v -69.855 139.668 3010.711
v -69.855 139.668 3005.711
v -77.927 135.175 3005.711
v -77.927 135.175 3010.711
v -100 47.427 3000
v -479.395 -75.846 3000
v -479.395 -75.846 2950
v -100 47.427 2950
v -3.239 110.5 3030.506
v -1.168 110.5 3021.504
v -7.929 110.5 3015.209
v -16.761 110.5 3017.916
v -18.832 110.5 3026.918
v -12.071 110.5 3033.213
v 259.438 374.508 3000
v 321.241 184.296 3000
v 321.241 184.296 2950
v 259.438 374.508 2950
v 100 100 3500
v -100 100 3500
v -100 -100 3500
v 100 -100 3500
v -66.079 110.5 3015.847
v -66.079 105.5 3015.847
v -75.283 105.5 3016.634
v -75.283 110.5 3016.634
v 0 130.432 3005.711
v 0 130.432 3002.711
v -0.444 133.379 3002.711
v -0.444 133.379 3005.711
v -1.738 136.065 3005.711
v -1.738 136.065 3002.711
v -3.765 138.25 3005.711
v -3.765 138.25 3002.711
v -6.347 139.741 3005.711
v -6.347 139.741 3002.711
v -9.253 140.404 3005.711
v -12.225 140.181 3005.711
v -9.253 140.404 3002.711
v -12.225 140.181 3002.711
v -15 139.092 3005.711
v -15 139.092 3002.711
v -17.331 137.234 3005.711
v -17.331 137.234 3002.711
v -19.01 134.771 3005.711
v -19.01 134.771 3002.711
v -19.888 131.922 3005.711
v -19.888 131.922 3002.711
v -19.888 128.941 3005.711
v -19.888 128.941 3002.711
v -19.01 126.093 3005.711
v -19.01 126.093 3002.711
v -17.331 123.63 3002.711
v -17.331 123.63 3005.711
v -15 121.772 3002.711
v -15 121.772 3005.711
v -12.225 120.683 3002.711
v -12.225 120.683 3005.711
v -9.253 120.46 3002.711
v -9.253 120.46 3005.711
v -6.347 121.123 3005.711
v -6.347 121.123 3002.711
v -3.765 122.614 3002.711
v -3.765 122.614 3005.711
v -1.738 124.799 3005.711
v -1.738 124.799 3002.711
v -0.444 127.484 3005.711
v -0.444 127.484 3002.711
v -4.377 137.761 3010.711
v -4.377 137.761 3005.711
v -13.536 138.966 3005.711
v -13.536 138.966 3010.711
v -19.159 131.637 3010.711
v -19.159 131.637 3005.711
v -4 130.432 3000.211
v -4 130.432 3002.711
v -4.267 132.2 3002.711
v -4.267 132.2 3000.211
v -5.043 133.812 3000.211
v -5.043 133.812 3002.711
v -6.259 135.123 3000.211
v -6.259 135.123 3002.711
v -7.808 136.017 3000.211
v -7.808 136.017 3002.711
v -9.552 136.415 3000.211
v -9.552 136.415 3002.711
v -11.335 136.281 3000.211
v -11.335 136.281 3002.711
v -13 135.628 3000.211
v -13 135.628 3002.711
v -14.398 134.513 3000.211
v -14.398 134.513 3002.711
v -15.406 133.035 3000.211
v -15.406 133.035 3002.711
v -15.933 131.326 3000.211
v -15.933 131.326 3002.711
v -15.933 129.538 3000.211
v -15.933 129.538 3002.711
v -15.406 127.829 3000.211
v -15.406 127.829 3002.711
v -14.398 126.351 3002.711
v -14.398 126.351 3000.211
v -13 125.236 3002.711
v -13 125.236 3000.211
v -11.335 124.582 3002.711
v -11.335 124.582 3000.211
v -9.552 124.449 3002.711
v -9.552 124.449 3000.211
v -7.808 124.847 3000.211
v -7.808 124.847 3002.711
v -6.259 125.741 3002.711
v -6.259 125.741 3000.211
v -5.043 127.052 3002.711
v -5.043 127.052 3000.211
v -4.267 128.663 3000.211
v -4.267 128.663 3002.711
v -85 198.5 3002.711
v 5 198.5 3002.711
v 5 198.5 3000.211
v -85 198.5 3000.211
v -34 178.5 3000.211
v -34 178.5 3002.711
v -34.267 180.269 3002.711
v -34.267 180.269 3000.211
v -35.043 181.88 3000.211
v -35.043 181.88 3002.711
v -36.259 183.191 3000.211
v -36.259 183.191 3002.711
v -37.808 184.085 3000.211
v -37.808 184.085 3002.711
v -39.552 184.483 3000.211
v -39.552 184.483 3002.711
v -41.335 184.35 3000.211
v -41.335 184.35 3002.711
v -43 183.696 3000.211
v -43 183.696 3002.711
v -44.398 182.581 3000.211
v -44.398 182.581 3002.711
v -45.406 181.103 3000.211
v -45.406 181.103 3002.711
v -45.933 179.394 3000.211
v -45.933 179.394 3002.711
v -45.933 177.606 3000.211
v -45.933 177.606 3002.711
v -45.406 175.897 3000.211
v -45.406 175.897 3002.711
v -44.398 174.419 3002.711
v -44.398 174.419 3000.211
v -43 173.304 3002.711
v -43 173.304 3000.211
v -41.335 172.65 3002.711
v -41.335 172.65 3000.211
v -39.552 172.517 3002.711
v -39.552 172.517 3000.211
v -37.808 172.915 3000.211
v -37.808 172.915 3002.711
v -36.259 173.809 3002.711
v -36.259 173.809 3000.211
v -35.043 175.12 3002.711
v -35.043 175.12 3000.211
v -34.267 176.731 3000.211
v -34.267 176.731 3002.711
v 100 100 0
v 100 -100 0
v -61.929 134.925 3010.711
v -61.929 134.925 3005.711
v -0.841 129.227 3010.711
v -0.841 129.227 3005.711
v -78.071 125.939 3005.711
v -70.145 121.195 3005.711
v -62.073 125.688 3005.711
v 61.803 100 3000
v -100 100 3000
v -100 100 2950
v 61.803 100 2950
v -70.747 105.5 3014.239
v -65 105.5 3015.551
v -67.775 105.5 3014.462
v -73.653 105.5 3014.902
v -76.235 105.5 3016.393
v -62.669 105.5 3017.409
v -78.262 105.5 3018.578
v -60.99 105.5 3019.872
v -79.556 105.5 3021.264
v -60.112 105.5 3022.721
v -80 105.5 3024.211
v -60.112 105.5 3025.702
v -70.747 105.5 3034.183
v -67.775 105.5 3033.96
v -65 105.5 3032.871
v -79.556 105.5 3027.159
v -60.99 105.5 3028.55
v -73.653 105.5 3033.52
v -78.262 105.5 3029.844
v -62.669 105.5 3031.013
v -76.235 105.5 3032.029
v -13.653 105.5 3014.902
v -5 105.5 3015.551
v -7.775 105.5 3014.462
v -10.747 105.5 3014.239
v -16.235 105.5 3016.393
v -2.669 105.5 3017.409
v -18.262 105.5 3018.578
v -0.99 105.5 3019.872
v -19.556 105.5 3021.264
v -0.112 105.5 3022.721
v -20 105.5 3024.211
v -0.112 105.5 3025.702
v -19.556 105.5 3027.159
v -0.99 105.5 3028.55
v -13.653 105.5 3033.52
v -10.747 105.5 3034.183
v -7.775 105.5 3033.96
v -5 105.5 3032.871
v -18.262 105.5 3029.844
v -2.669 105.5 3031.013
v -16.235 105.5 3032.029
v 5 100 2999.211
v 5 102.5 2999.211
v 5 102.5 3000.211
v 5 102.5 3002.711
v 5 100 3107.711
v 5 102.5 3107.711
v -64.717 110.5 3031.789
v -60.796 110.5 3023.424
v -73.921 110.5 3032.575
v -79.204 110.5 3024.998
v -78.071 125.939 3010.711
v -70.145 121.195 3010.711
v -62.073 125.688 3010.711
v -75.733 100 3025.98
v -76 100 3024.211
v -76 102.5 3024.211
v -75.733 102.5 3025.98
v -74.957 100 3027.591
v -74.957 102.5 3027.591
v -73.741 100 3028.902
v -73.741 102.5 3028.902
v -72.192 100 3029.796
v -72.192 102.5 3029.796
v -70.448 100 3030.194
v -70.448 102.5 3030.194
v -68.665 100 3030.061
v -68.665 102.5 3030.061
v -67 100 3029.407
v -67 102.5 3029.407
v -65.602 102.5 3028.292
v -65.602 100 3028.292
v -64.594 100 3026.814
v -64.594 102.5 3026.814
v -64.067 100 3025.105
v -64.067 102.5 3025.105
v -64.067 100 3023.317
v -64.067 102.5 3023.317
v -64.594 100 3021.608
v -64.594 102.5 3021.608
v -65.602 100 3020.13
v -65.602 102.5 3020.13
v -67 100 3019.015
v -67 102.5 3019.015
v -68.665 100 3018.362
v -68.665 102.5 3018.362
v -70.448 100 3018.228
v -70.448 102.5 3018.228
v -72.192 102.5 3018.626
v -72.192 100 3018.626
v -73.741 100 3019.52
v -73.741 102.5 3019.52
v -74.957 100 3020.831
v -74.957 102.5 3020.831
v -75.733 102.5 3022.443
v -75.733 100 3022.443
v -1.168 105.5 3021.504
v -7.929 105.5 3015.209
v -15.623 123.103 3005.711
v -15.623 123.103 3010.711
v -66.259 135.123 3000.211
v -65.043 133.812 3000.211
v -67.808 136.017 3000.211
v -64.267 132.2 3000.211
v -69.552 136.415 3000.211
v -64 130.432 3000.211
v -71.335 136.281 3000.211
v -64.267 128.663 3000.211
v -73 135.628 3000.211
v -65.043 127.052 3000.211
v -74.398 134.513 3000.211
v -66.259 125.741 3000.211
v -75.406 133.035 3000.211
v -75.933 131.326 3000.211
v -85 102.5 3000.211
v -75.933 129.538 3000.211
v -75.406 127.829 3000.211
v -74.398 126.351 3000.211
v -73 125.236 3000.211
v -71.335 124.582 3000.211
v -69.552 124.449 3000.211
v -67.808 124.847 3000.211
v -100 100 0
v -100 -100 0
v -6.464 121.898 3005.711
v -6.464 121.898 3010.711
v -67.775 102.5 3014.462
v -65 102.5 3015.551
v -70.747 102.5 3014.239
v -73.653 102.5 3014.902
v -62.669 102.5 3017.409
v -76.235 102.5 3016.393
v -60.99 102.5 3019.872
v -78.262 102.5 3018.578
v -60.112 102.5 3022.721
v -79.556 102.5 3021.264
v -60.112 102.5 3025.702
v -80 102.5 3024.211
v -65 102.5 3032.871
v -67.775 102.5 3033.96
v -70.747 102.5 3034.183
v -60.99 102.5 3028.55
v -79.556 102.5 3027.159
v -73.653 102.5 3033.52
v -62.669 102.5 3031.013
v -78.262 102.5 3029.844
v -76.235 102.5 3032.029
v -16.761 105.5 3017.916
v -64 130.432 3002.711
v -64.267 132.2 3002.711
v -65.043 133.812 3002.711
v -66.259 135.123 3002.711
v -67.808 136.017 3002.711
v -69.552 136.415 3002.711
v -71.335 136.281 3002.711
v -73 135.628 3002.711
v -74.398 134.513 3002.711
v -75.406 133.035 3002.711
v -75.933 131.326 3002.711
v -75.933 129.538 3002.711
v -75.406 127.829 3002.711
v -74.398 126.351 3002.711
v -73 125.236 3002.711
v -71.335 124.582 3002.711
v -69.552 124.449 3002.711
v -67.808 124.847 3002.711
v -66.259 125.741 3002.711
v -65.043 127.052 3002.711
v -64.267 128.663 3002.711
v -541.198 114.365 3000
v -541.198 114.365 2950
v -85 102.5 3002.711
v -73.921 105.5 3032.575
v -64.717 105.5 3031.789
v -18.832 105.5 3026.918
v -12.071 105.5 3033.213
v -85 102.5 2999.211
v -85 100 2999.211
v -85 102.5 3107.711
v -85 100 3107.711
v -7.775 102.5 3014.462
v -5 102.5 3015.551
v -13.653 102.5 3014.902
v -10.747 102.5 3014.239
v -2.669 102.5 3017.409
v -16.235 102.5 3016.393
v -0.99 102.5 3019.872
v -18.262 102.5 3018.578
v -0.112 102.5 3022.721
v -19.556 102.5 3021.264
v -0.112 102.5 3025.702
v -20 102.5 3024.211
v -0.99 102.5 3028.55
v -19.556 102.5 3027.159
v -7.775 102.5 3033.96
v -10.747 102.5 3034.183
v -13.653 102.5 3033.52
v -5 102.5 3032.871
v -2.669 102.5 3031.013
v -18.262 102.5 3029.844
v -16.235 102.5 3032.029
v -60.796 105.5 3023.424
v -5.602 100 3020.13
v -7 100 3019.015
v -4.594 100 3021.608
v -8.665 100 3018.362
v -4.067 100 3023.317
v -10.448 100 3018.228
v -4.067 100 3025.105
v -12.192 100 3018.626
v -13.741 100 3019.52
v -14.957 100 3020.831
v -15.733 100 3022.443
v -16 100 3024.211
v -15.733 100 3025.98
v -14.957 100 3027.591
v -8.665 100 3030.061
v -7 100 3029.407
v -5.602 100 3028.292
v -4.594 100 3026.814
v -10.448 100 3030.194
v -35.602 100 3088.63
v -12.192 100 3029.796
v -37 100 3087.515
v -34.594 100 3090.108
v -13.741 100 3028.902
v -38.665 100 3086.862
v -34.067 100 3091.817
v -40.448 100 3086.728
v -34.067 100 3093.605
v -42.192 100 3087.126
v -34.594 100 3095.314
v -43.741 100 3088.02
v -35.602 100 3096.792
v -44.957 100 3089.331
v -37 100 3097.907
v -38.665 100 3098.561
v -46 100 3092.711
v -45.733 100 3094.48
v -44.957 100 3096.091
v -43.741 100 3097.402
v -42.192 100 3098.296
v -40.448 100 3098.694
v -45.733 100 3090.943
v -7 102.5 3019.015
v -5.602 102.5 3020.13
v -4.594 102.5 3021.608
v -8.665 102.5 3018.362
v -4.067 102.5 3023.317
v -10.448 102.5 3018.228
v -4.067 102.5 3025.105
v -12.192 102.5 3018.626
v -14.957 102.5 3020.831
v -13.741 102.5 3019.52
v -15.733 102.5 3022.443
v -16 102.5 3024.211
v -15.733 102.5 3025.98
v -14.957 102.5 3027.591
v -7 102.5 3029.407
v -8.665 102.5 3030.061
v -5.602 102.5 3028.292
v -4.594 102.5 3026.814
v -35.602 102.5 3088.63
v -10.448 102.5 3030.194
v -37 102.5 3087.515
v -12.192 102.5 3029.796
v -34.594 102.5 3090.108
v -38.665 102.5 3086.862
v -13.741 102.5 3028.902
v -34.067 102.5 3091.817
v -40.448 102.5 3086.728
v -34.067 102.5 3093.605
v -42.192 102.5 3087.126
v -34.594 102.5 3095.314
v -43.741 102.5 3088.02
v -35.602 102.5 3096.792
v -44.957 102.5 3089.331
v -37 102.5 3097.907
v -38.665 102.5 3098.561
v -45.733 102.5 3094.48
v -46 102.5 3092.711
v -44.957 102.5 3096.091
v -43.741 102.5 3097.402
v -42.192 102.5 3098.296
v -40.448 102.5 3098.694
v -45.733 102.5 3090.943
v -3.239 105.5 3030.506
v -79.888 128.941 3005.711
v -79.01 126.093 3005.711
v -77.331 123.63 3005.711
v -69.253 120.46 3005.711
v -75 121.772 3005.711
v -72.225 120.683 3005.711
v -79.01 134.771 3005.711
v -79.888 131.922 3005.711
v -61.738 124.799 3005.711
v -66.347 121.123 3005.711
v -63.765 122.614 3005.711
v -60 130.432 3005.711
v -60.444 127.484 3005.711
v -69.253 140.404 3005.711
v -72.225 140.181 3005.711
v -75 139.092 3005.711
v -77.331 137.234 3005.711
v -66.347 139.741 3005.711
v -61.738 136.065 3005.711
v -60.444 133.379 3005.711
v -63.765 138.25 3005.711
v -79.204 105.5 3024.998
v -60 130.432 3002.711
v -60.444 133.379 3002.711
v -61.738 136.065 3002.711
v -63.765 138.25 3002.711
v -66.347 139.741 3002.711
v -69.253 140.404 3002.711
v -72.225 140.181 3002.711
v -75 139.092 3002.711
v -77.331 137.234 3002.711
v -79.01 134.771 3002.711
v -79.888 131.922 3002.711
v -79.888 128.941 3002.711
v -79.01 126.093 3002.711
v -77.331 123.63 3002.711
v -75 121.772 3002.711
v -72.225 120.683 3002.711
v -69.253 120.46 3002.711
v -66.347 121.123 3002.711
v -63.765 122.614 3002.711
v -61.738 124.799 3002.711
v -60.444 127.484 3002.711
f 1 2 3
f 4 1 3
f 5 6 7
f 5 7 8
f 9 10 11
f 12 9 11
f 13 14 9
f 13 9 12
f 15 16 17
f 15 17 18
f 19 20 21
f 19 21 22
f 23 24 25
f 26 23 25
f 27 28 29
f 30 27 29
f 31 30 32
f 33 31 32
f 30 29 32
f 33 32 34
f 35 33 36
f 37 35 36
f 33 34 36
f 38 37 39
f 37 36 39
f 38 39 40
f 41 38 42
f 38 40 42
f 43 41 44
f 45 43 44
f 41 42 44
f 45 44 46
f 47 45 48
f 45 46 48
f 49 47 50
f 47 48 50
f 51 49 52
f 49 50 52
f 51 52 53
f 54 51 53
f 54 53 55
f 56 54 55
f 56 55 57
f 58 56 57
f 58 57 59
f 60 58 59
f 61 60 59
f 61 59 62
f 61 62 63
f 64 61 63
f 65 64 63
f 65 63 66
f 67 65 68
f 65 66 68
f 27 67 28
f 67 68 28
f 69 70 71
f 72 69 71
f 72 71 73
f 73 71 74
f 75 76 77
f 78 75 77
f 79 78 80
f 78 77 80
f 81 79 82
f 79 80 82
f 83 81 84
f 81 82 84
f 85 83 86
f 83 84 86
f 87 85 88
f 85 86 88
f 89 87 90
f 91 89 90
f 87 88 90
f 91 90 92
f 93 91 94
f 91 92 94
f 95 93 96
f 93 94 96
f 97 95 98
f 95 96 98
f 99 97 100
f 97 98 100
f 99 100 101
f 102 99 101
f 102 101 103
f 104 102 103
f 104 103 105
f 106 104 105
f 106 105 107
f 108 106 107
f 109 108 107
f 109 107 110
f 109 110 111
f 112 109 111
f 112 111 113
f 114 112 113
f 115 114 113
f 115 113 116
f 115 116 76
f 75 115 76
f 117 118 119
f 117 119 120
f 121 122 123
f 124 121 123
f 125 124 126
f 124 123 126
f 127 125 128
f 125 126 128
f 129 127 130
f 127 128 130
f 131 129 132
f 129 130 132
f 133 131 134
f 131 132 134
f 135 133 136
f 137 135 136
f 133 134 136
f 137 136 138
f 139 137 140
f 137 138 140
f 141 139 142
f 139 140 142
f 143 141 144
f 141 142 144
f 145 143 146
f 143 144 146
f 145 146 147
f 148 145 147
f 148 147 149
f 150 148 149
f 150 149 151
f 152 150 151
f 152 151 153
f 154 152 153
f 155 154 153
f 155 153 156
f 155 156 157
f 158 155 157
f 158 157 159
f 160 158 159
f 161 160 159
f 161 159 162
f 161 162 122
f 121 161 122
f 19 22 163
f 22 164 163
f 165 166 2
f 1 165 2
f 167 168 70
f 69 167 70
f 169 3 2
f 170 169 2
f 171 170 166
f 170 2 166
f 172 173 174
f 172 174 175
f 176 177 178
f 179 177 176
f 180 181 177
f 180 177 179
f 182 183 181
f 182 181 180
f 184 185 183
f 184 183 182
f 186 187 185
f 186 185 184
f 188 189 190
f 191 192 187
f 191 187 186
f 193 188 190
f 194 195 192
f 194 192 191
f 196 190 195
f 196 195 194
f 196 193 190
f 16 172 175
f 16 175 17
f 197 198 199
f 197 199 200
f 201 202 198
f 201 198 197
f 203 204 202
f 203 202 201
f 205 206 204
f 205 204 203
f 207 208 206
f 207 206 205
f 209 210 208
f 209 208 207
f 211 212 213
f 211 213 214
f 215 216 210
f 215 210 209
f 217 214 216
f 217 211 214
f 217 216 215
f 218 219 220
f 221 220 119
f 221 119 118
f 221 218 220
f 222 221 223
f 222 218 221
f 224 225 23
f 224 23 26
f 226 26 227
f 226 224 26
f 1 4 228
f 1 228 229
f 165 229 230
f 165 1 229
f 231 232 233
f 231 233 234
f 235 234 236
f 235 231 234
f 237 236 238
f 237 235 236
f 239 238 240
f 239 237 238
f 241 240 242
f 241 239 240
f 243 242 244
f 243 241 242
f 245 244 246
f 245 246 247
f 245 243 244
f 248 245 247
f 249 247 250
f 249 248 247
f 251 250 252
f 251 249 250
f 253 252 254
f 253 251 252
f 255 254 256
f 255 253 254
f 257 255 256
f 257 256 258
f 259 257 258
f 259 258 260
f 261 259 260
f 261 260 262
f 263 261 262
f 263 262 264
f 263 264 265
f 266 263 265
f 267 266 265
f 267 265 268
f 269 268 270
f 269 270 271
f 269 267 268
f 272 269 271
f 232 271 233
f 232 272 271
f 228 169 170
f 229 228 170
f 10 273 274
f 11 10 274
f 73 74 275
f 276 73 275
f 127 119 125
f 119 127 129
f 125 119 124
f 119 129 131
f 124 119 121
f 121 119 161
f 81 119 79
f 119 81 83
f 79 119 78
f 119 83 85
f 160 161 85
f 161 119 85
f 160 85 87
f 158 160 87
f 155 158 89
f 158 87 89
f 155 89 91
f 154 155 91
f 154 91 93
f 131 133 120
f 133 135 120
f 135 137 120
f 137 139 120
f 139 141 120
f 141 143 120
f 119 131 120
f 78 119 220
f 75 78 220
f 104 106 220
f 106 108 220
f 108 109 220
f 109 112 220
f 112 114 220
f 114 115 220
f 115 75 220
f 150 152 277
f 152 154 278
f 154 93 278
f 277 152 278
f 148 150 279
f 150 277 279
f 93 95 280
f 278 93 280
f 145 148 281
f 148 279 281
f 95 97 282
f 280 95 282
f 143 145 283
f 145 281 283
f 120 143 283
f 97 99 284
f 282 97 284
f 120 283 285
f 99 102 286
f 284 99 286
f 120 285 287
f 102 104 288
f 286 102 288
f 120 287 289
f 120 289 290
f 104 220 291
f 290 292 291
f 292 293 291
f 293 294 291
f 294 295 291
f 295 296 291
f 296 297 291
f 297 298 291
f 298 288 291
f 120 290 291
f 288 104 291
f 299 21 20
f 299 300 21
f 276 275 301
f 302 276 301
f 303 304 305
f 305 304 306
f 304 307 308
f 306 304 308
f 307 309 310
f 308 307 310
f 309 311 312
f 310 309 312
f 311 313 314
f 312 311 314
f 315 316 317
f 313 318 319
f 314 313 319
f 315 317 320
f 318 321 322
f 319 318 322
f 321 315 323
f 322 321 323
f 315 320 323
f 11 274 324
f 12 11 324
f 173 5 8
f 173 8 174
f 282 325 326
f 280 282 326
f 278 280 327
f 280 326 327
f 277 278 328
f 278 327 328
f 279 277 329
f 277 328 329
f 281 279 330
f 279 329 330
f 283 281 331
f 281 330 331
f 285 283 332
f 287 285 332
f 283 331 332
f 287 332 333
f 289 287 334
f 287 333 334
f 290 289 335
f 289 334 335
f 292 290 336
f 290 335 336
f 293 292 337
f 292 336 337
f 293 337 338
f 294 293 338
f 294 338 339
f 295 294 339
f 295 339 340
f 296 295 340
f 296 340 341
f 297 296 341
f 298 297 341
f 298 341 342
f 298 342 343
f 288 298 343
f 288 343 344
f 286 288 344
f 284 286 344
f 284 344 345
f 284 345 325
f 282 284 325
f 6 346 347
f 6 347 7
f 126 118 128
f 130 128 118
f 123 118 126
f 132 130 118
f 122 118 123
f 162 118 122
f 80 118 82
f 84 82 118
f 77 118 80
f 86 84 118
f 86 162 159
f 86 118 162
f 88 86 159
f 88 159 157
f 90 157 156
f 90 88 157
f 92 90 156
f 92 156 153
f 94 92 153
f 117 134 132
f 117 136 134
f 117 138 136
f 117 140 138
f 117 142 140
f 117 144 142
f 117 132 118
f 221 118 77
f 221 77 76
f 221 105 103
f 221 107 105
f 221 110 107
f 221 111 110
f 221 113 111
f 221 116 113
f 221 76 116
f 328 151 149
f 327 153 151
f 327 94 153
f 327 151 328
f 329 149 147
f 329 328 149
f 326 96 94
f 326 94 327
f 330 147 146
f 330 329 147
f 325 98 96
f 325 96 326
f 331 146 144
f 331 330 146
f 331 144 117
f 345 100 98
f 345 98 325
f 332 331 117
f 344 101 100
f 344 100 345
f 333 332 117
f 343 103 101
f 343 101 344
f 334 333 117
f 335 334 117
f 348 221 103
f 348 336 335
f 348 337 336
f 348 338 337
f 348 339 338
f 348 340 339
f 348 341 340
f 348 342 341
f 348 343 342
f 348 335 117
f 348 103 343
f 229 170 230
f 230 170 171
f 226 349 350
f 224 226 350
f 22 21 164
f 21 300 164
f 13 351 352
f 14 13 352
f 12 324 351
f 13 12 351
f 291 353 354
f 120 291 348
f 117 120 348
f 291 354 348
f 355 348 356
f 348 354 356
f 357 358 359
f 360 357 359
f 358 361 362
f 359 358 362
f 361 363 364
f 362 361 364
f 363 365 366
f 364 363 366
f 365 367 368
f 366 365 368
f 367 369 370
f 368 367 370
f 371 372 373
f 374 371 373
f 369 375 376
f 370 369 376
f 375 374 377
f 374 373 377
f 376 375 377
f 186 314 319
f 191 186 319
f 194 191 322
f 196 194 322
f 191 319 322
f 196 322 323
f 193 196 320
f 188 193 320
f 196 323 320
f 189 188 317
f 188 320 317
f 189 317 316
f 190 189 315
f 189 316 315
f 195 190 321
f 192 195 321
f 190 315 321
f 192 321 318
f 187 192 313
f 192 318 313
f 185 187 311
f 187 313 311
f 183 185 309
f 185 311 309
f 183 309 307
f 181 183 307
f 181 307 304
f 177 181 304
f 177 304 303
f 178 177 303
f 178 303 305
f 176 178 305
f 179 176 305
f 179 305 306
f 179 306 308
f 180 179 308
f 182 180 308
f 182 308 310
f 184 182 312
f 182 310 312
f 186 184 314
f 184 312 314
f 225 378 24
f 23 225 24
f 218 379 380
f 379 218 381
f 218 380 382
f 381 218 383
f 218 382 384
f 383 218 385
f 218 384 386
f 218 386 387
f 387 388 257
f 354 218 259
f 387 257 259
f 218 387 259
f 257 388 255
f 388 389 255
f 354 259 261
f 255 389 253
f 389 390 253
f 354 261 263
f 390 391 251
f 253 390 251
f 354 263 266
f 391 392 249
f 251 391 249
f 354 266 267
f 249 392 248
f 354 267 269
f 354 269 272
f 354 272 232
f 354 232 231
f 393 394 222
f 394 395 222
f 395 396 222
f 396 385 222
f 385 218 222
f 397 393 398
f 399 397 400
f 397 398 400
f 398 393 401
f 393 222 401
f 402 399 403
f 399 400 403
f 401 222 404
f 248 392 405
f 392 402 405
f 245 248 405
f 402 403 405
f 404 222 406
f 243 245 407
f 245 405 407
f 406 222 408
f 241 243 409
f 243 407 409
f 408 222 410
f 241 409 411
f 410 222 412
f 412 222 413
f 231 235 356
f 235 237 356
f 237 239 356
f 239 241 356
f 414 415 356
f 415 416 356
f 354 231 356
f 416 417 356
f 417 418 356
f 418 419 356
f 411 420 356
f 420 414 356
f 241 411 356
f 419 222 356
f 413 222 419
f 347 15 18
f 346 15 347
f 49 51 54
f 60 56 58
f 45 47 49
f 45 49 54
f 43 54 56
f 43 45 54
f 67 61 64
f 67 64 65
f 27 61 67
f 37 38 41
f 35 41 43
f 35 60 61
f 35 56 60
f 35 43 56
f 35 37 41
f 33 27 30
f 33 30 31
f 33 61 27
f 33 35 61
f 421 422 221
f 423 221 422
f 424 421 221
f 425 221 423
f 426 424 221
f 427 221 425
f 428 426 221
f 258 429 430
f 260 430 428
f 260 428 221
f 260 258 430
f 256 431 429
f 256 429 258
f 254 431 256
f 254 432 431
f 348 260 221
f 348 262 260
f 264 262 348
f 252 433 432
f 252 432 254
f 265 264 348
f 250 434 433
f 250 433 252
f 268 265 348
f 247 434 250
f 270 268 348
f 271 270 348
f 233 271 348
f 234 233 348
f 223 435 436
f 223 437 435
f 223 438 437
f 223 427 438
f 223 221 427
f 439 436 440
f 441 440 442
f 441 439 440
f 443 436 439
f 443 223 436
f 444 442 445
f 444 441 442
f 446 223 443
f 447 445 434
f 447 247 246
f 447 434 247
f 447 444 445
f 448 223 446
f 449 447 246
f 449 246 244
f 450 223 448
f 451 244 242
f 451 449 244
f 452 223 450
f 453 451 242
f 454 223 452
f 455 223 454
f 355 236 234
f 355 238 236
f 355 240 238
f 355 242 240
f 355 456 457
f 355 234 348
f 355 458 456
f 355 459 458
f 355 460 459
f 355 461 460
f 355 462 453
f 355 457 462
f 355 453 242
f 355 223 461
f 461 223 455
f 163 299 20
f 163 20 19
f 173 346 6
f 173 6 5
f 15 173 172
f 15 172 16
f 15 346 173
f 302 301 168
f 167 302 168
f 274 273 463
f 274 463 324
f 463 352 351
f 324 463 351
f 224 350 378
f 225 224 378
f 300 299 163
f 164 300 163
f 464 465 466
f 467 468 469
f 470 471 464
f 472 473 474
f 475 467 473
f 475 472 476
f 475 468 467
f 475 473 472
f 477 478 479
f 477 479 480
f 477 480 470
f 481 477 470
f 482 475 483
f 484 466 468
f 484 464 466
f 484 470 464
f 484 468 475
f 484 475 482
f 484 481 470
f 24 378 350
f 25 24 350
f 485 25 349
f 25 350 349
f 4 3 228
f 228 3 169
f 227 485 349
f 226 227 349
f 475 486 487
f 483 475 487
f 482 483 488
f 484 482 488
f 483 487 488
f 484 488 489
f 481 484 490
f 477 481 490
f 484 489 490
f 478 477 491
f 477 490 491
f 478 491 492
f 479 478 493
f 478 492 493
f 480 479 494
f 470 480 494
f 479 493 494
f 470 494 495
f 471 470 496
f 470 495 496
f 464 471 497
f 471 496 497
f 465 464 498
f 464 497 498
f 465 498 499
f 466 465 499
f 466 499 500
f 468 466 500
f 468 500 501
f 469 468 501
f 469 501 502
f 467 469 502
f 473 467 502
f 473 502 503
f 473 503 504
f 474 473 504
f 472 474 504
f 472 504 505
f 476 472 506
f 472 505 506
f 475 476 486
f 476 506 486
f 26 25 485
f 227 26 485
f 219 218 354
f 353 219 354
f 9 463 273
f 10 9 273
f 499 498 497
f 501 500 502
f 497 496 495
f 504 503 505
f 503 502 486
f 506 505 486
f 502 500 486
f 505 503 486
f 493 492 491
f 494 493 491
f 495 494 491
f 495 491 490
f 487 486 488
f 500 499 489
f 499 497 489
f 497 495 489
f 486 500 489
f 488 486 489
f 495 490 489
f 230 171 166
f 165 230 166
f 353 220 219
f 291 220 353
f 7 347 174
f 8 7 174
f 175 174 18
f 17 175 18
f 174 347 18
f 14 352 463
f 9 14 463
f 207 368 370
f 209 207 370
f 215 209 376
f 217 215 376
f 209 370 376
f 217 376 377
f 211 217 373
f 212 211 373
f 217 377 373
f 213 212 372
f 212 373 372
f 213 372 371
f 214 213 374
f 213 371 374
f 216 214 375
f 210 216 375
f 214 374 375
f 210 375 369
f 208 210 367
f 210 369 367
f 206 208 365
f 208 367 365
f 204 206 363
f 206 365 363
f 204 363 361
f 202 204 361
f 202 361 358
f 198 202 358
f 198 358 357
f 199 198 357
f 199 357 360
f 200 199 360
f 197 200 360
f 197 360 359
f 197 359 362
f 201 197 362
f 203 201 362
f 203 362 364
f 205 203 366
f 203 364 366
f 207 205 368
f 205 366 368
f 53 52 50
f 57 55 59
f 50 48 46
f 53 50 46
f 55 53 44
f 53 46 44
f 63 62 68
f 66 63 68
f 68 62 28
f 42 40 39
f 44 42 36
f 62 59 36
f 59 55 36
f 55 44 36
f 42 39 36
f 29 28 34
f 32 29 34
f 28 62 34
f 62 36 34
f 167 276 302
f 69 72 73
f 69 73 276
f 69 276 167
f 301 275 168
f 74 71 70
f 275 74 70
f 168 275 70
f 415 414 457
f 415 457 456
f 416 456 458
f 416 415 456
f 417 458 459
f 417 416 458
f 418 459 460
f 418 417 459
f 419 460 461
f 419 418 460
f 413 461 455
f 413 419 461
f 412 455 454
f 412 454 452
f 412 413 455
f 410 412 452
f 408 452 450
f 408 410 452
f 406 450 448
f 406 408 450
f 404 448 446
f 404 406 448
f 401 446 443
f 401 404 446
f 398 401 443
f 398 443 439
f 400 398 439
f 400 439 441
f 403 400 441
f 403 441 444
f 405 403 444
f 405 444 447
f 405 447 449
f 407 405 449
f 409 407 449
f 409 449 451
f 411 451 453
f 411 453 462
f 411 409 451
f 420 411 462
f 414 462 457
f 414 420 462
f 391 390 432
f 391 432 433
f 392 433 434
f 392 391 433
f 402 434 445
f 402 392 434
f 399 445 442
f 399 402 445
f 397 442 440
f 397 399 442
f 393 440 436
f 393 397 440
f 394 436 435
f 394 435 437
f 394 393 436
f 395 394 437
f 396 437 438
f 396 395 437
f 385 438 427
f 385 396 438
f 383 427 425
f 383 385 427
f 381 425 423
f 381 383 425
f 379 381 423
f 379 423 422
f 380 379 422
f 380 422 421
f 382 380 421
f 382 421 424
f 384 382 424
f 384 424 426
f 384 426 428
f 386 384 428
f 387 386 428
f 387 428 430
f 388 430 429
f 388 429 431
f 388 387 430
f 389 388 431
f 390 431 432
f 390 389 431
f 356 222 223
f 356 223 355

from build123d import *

# Parameters (mm, degrees)
F0_W      = 200
F0_H      = 200
F1_DEPTH  = 3000
F3_DEPTH  = 50
F4_DEPTH  = 500
F5_W      = 90
F5_H      = 108.5
F5_R      = 6
F6_DEPTH  = 2.5
F7_W      = 90
F7_H      = 2.5
F8_DEPTH  = 96
F9_R      = 6
F10_DEPTH = 25
F11_R     = 10
F12_DEPTH = 3
F14_DEPTH = 5
F15_R     = 10
F16_DEPTH = 3
F18_DEPTH = 5
F20_DEPTH = 5
F22_DEPTH = 5


with BuildPart() as f1:
    # F0 (on Top) → F1 (new body)
    with BuildSketch(Plane.XY):
        Rectangle(F0_W, F0_H)
    extrude(amount=F1_DEPTH)

    # F4 (add): a face of the model
    f4_faces = [f1.faces().sort_by_distance(p)[0] for p in [
        (0, 0, 3000),
    ]]
    extrude(f4_faces, amount=F4_DEPTH)


with BuildPart() as f3:
    # F2 (on face) → F3 (new body)
    with BuildSketch(Plane.XY.offset(3000)):
        Polygon((-541.1982426134, 114.3653346673), (-479.3948437385, -75.8459685917), (-100, 47.4268887881), (-100, 100), (61.803398875, 100), (321.2412034368, 184.2964526496), (259.4378045618, 374.5077559086), align=None)
    extrude(amount=-F3_DEPTH)


with BuildPart() as f6:
    # F5 (on face) → F6 (new body)
    with BuildSketch(Plane(origin=(0, 100, 0), x_dir=(-1, 0, 0), z_dir=(0, 1, 0))):
        with Locations((40, 3053.461101532)):
            Rectangle(F5_W, F5_H)
        with Locations((10, 3024.211101532)):
            Circle(F5_R, mode=Mode.SUBTRACT)
        with Locations((70, 3024.211101532)):
            Circle(F5_R, mode=Mode.SUBTRACT)
        with Locations((40, 3092.711101532)):
            Circle(F5_R, mode=Mode.SUBTRACT)
    extrude(amount=F6_DEPTH)

    # F7 (on face) → F8 (join)
    with BuildSketch(Plane(origin=(0, 102.5, 0), x_dir=(-1, 0, 0), z_dir=(0, 1, 0))):
        with Locations((40, 3001.461101532)):
            Rectangle(F7_W, F7_H)
    extrude(amount=F8_DEPTH)

    # F9 (on face) → F10 (cut)
    with BuildSketch(Plane.XY.offset(3002.711101532)):
        with Locations((-70, 130.4318457842)):
            Circle(F9_R)
        with Locations((-10, 130.4318457842)):
            Circle(F9_R)
        with Locations((-40, 178.5)):
            Circle(F9_R)
    extrude(amount=-F10_DEPTH, mode=Mode.SUBTRACT)


with BuildPart() as f12:
    # F11 (on face) → F12 (new body)
    with BuildSketch(Plane(origin=(0, 102.5, 0), x_dir=(-1, 0, 0), z_dir=(0, 1, 0))):
        with Locations((10, 3024.211101532)):
            Circle(F11_R)
    extrude(amount=F12_DEPTH)


with BuildPart() as f12b:
    # F11 (on face) → F12, piece 2 (new body)
    with BuildSketch(Plane(origin=(0, 102.5, 0), x_dir=(-1, 0, 0), z_dir=(0, 1, 0))):
        with Locations((70, 3024.211101532)):
            Circle(F11_R)
    extrude(amount=F12_DEPTH)


with BuildPart() as f14:
    # F13 (on face) → F14 (new body)
    with BuildSketch(Plane(origin=(0, 105.5, 0), x_dir=(-1, 0, 0), z_dir=(0, 1, 0))):
        Polygon((18.831995198, 3026.9183499794), (12.0714516691, 3033.2134579633), (3.2394564712, 3030.5062095158), (1.168004802, 3021.5038530845), (7.9285483309, 3015.2087451007), (16.7605435288, 3017.9159935482), align=None)
    extrude(amount=F14_DEPTH)


with BuildPart() as f16:
    # F15 (on face) → F16 (new body)
    with BuildSketch(Plane.XY.offset(3002.711101532)):
        with Locations((-10, 130.4318457842)):
            Circle(F15_R)
    extrude(amount=F16_DEPTH)


with BuildPart() as f16b:
    # F15 (on face) → F16, piece 2 (new body)
    with BuildSketch(Plane.XY.offset(3002.711101532)):
        with Locations((-70, 130.4318457842)):
            Circle(F15_R)
    extrude(amount=F16_DEPTH)


with BuildPart() as f18:
    # F17 (on face) → F18 (new body)
    with BuildSketch(Plane.XY.offset(3005.711101532)):
        Polygon((-69.8552391039, 139.6683157601), (-77.9266371924, 135.1754473857), (-78.0713980885, 125.9389774097), (-70.1447608961, 121.1953758083), (-62.0733628076, 125.6882441827), (-61.9286019115, 134.9247141586), align=None)
    extrude(amount=F18_DEPTH)


with BuildPart() as f20:
    # F19 (on face) → F20 (new body)
    with BuildSketch(Plane.XY.offset(3005.711101532)):
        Polygon((-13.5356847146, 138.9660280492), (-19.1586609993, 131.6369441341), (-15.6229762847, 123.1027618691), (-6.4643152854, 121.8976635192), (-0.8413390007, 129.2267474343), (-4.3770237153, 137.7609296993), align=None)
    extrude(amount=F20_DEPTH)


with BuildPart() as f22:
    # F21 (on face) → F22 (new body)
    with BuildSketch(Plane(origin=(0, 105.5, 0), x_dir=(-1, 0, 0), z_dir=(0, 1, 0))):
        Polygon((64.716681768, 3031.7886922964), (60.7959547825, 3023.424409109), (66.0792730145, 3015.8468183446), (75.283318232, 3016.6335107676), (79.2040452175, 3024.9977939549), (73.9207269855, 3032.5753847194), align=None)
    extrude(amount=F22_DEPTH)


solid = Compound([f1.part, f3.part, f6.part, f12.part, f12b.part, f14.part, f16.part, f16b.part, f18.part, f20.part, f22.part])
